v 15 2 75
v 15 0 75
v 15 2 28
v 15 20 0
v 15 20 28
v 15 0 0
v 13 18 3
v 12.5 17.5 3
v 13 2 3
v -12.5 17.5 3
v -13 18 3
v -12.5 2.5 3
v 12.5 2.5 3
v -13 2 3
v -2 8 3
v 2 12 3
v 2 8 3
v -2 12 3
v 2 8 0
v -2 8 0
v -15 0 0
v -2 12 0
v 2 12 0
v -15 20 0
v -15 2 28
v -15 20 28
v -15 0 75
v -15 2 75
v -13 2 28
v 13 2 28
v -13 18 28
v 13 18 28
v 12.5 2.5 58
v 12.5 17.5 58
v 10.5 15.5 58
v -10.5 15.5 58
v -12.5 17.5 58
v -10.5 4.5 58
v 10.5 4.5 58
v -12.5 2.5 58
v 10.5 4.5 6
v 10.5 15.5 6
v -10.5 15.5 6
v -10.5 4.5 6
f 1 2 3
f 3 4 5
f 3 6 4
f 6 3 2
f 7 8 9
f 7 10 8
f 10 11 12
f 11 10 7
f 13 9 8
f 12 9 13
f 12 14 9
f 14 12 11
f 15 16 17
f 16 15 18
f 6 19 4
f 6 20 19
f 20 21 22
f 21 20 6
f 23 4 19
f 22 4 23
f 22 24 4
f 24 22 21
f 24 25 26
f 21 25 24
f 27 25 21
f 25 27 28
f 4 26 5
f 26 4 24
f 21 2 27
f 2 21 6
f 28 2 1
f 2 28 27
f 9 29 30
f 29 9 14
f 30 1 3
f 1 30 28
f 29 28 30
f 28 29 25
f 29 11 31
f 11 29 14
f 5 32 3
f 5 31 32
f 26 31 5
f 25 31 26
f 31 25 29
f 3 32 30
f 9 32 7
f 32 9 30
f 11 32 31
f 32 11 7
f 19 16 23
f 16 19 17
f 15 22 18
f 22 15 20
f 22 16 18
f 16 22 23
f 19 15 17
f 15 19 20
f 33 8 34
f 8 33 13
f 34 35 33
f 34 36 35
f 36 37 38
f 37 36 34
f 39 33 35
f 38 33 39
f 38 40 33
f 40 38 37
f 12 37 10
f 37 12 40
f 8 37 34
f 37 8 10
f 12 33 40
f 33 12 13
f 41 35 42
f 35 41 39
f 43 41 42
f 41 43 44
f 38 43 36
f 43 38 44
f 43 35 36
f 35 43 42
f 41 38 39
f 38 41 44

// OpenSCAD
// Provisional two-part tank. Units: mm. Part: tank, holder, assembly.
// Exact nominal sizes match supplied STL. No sensor clip or splash lid included.
part = "assembly";
tank_width = 25;
tank_depth = 15;
tank_height = 55;
tank_wall = 2;
tank_floor = 3;
holder_wall = 2;
holder_floor = 3;
holder_height = 75;
holder_lip_height = 28;
clearance_per_side = 0.5;
drain_size = 4;
water_depth = 35;
example_sensor_height = 62;
example_sensor_width = 20;
example_pcb_thickness = 1.6;
example_sensor_envelope_depth = 8;
sensor_floor_clearance = 2;
w=tank_width; d=tank_depth; h=tank_height; t=tank_wall; f=tank_floor;
c=clearance_per_side; s=holder_wall; b=holder_floor;
hw=w+2*(c+s); hd=d+2*(c+s); hh=holder_height; lip=holder_lip_height;
module tank(){
  difference(){
    translate([-w/2,0,0]) cube([w,d,h]);
    translate([-w/2+t,t,f]) cube([w-2*t,d-2*t,h-f+1]);
  }
}
module holder(){
  difference(){
    union(){
      translate([-hw/2,0,0]) cube([hw,hd,b]);
      translate([-hw/2,0,0]) cube([hw,s,hh]);
      translate([-hw/2,s,b]) cube([s,hd-s,lip-b]);
      translate([hw/2-s,s,b]) cube([s,hd-s,lip-b]);
      translate([-hw/2,hd-s,b]) cube([hw,s,lip-b]);
    }
    translate([-drain_size/2,hd/2-drain_size/2,-1]) cube([drain_size,drain_size,b+1.01]);
  }
}
if(part=="tank") tank();
else if(part=="holder") holder();
else {
  color([0.25,0.30,0.37]) holder();
  translate([0,s+c,b]) color([0.16,0.63,0.68,0.75]) tank();
}
